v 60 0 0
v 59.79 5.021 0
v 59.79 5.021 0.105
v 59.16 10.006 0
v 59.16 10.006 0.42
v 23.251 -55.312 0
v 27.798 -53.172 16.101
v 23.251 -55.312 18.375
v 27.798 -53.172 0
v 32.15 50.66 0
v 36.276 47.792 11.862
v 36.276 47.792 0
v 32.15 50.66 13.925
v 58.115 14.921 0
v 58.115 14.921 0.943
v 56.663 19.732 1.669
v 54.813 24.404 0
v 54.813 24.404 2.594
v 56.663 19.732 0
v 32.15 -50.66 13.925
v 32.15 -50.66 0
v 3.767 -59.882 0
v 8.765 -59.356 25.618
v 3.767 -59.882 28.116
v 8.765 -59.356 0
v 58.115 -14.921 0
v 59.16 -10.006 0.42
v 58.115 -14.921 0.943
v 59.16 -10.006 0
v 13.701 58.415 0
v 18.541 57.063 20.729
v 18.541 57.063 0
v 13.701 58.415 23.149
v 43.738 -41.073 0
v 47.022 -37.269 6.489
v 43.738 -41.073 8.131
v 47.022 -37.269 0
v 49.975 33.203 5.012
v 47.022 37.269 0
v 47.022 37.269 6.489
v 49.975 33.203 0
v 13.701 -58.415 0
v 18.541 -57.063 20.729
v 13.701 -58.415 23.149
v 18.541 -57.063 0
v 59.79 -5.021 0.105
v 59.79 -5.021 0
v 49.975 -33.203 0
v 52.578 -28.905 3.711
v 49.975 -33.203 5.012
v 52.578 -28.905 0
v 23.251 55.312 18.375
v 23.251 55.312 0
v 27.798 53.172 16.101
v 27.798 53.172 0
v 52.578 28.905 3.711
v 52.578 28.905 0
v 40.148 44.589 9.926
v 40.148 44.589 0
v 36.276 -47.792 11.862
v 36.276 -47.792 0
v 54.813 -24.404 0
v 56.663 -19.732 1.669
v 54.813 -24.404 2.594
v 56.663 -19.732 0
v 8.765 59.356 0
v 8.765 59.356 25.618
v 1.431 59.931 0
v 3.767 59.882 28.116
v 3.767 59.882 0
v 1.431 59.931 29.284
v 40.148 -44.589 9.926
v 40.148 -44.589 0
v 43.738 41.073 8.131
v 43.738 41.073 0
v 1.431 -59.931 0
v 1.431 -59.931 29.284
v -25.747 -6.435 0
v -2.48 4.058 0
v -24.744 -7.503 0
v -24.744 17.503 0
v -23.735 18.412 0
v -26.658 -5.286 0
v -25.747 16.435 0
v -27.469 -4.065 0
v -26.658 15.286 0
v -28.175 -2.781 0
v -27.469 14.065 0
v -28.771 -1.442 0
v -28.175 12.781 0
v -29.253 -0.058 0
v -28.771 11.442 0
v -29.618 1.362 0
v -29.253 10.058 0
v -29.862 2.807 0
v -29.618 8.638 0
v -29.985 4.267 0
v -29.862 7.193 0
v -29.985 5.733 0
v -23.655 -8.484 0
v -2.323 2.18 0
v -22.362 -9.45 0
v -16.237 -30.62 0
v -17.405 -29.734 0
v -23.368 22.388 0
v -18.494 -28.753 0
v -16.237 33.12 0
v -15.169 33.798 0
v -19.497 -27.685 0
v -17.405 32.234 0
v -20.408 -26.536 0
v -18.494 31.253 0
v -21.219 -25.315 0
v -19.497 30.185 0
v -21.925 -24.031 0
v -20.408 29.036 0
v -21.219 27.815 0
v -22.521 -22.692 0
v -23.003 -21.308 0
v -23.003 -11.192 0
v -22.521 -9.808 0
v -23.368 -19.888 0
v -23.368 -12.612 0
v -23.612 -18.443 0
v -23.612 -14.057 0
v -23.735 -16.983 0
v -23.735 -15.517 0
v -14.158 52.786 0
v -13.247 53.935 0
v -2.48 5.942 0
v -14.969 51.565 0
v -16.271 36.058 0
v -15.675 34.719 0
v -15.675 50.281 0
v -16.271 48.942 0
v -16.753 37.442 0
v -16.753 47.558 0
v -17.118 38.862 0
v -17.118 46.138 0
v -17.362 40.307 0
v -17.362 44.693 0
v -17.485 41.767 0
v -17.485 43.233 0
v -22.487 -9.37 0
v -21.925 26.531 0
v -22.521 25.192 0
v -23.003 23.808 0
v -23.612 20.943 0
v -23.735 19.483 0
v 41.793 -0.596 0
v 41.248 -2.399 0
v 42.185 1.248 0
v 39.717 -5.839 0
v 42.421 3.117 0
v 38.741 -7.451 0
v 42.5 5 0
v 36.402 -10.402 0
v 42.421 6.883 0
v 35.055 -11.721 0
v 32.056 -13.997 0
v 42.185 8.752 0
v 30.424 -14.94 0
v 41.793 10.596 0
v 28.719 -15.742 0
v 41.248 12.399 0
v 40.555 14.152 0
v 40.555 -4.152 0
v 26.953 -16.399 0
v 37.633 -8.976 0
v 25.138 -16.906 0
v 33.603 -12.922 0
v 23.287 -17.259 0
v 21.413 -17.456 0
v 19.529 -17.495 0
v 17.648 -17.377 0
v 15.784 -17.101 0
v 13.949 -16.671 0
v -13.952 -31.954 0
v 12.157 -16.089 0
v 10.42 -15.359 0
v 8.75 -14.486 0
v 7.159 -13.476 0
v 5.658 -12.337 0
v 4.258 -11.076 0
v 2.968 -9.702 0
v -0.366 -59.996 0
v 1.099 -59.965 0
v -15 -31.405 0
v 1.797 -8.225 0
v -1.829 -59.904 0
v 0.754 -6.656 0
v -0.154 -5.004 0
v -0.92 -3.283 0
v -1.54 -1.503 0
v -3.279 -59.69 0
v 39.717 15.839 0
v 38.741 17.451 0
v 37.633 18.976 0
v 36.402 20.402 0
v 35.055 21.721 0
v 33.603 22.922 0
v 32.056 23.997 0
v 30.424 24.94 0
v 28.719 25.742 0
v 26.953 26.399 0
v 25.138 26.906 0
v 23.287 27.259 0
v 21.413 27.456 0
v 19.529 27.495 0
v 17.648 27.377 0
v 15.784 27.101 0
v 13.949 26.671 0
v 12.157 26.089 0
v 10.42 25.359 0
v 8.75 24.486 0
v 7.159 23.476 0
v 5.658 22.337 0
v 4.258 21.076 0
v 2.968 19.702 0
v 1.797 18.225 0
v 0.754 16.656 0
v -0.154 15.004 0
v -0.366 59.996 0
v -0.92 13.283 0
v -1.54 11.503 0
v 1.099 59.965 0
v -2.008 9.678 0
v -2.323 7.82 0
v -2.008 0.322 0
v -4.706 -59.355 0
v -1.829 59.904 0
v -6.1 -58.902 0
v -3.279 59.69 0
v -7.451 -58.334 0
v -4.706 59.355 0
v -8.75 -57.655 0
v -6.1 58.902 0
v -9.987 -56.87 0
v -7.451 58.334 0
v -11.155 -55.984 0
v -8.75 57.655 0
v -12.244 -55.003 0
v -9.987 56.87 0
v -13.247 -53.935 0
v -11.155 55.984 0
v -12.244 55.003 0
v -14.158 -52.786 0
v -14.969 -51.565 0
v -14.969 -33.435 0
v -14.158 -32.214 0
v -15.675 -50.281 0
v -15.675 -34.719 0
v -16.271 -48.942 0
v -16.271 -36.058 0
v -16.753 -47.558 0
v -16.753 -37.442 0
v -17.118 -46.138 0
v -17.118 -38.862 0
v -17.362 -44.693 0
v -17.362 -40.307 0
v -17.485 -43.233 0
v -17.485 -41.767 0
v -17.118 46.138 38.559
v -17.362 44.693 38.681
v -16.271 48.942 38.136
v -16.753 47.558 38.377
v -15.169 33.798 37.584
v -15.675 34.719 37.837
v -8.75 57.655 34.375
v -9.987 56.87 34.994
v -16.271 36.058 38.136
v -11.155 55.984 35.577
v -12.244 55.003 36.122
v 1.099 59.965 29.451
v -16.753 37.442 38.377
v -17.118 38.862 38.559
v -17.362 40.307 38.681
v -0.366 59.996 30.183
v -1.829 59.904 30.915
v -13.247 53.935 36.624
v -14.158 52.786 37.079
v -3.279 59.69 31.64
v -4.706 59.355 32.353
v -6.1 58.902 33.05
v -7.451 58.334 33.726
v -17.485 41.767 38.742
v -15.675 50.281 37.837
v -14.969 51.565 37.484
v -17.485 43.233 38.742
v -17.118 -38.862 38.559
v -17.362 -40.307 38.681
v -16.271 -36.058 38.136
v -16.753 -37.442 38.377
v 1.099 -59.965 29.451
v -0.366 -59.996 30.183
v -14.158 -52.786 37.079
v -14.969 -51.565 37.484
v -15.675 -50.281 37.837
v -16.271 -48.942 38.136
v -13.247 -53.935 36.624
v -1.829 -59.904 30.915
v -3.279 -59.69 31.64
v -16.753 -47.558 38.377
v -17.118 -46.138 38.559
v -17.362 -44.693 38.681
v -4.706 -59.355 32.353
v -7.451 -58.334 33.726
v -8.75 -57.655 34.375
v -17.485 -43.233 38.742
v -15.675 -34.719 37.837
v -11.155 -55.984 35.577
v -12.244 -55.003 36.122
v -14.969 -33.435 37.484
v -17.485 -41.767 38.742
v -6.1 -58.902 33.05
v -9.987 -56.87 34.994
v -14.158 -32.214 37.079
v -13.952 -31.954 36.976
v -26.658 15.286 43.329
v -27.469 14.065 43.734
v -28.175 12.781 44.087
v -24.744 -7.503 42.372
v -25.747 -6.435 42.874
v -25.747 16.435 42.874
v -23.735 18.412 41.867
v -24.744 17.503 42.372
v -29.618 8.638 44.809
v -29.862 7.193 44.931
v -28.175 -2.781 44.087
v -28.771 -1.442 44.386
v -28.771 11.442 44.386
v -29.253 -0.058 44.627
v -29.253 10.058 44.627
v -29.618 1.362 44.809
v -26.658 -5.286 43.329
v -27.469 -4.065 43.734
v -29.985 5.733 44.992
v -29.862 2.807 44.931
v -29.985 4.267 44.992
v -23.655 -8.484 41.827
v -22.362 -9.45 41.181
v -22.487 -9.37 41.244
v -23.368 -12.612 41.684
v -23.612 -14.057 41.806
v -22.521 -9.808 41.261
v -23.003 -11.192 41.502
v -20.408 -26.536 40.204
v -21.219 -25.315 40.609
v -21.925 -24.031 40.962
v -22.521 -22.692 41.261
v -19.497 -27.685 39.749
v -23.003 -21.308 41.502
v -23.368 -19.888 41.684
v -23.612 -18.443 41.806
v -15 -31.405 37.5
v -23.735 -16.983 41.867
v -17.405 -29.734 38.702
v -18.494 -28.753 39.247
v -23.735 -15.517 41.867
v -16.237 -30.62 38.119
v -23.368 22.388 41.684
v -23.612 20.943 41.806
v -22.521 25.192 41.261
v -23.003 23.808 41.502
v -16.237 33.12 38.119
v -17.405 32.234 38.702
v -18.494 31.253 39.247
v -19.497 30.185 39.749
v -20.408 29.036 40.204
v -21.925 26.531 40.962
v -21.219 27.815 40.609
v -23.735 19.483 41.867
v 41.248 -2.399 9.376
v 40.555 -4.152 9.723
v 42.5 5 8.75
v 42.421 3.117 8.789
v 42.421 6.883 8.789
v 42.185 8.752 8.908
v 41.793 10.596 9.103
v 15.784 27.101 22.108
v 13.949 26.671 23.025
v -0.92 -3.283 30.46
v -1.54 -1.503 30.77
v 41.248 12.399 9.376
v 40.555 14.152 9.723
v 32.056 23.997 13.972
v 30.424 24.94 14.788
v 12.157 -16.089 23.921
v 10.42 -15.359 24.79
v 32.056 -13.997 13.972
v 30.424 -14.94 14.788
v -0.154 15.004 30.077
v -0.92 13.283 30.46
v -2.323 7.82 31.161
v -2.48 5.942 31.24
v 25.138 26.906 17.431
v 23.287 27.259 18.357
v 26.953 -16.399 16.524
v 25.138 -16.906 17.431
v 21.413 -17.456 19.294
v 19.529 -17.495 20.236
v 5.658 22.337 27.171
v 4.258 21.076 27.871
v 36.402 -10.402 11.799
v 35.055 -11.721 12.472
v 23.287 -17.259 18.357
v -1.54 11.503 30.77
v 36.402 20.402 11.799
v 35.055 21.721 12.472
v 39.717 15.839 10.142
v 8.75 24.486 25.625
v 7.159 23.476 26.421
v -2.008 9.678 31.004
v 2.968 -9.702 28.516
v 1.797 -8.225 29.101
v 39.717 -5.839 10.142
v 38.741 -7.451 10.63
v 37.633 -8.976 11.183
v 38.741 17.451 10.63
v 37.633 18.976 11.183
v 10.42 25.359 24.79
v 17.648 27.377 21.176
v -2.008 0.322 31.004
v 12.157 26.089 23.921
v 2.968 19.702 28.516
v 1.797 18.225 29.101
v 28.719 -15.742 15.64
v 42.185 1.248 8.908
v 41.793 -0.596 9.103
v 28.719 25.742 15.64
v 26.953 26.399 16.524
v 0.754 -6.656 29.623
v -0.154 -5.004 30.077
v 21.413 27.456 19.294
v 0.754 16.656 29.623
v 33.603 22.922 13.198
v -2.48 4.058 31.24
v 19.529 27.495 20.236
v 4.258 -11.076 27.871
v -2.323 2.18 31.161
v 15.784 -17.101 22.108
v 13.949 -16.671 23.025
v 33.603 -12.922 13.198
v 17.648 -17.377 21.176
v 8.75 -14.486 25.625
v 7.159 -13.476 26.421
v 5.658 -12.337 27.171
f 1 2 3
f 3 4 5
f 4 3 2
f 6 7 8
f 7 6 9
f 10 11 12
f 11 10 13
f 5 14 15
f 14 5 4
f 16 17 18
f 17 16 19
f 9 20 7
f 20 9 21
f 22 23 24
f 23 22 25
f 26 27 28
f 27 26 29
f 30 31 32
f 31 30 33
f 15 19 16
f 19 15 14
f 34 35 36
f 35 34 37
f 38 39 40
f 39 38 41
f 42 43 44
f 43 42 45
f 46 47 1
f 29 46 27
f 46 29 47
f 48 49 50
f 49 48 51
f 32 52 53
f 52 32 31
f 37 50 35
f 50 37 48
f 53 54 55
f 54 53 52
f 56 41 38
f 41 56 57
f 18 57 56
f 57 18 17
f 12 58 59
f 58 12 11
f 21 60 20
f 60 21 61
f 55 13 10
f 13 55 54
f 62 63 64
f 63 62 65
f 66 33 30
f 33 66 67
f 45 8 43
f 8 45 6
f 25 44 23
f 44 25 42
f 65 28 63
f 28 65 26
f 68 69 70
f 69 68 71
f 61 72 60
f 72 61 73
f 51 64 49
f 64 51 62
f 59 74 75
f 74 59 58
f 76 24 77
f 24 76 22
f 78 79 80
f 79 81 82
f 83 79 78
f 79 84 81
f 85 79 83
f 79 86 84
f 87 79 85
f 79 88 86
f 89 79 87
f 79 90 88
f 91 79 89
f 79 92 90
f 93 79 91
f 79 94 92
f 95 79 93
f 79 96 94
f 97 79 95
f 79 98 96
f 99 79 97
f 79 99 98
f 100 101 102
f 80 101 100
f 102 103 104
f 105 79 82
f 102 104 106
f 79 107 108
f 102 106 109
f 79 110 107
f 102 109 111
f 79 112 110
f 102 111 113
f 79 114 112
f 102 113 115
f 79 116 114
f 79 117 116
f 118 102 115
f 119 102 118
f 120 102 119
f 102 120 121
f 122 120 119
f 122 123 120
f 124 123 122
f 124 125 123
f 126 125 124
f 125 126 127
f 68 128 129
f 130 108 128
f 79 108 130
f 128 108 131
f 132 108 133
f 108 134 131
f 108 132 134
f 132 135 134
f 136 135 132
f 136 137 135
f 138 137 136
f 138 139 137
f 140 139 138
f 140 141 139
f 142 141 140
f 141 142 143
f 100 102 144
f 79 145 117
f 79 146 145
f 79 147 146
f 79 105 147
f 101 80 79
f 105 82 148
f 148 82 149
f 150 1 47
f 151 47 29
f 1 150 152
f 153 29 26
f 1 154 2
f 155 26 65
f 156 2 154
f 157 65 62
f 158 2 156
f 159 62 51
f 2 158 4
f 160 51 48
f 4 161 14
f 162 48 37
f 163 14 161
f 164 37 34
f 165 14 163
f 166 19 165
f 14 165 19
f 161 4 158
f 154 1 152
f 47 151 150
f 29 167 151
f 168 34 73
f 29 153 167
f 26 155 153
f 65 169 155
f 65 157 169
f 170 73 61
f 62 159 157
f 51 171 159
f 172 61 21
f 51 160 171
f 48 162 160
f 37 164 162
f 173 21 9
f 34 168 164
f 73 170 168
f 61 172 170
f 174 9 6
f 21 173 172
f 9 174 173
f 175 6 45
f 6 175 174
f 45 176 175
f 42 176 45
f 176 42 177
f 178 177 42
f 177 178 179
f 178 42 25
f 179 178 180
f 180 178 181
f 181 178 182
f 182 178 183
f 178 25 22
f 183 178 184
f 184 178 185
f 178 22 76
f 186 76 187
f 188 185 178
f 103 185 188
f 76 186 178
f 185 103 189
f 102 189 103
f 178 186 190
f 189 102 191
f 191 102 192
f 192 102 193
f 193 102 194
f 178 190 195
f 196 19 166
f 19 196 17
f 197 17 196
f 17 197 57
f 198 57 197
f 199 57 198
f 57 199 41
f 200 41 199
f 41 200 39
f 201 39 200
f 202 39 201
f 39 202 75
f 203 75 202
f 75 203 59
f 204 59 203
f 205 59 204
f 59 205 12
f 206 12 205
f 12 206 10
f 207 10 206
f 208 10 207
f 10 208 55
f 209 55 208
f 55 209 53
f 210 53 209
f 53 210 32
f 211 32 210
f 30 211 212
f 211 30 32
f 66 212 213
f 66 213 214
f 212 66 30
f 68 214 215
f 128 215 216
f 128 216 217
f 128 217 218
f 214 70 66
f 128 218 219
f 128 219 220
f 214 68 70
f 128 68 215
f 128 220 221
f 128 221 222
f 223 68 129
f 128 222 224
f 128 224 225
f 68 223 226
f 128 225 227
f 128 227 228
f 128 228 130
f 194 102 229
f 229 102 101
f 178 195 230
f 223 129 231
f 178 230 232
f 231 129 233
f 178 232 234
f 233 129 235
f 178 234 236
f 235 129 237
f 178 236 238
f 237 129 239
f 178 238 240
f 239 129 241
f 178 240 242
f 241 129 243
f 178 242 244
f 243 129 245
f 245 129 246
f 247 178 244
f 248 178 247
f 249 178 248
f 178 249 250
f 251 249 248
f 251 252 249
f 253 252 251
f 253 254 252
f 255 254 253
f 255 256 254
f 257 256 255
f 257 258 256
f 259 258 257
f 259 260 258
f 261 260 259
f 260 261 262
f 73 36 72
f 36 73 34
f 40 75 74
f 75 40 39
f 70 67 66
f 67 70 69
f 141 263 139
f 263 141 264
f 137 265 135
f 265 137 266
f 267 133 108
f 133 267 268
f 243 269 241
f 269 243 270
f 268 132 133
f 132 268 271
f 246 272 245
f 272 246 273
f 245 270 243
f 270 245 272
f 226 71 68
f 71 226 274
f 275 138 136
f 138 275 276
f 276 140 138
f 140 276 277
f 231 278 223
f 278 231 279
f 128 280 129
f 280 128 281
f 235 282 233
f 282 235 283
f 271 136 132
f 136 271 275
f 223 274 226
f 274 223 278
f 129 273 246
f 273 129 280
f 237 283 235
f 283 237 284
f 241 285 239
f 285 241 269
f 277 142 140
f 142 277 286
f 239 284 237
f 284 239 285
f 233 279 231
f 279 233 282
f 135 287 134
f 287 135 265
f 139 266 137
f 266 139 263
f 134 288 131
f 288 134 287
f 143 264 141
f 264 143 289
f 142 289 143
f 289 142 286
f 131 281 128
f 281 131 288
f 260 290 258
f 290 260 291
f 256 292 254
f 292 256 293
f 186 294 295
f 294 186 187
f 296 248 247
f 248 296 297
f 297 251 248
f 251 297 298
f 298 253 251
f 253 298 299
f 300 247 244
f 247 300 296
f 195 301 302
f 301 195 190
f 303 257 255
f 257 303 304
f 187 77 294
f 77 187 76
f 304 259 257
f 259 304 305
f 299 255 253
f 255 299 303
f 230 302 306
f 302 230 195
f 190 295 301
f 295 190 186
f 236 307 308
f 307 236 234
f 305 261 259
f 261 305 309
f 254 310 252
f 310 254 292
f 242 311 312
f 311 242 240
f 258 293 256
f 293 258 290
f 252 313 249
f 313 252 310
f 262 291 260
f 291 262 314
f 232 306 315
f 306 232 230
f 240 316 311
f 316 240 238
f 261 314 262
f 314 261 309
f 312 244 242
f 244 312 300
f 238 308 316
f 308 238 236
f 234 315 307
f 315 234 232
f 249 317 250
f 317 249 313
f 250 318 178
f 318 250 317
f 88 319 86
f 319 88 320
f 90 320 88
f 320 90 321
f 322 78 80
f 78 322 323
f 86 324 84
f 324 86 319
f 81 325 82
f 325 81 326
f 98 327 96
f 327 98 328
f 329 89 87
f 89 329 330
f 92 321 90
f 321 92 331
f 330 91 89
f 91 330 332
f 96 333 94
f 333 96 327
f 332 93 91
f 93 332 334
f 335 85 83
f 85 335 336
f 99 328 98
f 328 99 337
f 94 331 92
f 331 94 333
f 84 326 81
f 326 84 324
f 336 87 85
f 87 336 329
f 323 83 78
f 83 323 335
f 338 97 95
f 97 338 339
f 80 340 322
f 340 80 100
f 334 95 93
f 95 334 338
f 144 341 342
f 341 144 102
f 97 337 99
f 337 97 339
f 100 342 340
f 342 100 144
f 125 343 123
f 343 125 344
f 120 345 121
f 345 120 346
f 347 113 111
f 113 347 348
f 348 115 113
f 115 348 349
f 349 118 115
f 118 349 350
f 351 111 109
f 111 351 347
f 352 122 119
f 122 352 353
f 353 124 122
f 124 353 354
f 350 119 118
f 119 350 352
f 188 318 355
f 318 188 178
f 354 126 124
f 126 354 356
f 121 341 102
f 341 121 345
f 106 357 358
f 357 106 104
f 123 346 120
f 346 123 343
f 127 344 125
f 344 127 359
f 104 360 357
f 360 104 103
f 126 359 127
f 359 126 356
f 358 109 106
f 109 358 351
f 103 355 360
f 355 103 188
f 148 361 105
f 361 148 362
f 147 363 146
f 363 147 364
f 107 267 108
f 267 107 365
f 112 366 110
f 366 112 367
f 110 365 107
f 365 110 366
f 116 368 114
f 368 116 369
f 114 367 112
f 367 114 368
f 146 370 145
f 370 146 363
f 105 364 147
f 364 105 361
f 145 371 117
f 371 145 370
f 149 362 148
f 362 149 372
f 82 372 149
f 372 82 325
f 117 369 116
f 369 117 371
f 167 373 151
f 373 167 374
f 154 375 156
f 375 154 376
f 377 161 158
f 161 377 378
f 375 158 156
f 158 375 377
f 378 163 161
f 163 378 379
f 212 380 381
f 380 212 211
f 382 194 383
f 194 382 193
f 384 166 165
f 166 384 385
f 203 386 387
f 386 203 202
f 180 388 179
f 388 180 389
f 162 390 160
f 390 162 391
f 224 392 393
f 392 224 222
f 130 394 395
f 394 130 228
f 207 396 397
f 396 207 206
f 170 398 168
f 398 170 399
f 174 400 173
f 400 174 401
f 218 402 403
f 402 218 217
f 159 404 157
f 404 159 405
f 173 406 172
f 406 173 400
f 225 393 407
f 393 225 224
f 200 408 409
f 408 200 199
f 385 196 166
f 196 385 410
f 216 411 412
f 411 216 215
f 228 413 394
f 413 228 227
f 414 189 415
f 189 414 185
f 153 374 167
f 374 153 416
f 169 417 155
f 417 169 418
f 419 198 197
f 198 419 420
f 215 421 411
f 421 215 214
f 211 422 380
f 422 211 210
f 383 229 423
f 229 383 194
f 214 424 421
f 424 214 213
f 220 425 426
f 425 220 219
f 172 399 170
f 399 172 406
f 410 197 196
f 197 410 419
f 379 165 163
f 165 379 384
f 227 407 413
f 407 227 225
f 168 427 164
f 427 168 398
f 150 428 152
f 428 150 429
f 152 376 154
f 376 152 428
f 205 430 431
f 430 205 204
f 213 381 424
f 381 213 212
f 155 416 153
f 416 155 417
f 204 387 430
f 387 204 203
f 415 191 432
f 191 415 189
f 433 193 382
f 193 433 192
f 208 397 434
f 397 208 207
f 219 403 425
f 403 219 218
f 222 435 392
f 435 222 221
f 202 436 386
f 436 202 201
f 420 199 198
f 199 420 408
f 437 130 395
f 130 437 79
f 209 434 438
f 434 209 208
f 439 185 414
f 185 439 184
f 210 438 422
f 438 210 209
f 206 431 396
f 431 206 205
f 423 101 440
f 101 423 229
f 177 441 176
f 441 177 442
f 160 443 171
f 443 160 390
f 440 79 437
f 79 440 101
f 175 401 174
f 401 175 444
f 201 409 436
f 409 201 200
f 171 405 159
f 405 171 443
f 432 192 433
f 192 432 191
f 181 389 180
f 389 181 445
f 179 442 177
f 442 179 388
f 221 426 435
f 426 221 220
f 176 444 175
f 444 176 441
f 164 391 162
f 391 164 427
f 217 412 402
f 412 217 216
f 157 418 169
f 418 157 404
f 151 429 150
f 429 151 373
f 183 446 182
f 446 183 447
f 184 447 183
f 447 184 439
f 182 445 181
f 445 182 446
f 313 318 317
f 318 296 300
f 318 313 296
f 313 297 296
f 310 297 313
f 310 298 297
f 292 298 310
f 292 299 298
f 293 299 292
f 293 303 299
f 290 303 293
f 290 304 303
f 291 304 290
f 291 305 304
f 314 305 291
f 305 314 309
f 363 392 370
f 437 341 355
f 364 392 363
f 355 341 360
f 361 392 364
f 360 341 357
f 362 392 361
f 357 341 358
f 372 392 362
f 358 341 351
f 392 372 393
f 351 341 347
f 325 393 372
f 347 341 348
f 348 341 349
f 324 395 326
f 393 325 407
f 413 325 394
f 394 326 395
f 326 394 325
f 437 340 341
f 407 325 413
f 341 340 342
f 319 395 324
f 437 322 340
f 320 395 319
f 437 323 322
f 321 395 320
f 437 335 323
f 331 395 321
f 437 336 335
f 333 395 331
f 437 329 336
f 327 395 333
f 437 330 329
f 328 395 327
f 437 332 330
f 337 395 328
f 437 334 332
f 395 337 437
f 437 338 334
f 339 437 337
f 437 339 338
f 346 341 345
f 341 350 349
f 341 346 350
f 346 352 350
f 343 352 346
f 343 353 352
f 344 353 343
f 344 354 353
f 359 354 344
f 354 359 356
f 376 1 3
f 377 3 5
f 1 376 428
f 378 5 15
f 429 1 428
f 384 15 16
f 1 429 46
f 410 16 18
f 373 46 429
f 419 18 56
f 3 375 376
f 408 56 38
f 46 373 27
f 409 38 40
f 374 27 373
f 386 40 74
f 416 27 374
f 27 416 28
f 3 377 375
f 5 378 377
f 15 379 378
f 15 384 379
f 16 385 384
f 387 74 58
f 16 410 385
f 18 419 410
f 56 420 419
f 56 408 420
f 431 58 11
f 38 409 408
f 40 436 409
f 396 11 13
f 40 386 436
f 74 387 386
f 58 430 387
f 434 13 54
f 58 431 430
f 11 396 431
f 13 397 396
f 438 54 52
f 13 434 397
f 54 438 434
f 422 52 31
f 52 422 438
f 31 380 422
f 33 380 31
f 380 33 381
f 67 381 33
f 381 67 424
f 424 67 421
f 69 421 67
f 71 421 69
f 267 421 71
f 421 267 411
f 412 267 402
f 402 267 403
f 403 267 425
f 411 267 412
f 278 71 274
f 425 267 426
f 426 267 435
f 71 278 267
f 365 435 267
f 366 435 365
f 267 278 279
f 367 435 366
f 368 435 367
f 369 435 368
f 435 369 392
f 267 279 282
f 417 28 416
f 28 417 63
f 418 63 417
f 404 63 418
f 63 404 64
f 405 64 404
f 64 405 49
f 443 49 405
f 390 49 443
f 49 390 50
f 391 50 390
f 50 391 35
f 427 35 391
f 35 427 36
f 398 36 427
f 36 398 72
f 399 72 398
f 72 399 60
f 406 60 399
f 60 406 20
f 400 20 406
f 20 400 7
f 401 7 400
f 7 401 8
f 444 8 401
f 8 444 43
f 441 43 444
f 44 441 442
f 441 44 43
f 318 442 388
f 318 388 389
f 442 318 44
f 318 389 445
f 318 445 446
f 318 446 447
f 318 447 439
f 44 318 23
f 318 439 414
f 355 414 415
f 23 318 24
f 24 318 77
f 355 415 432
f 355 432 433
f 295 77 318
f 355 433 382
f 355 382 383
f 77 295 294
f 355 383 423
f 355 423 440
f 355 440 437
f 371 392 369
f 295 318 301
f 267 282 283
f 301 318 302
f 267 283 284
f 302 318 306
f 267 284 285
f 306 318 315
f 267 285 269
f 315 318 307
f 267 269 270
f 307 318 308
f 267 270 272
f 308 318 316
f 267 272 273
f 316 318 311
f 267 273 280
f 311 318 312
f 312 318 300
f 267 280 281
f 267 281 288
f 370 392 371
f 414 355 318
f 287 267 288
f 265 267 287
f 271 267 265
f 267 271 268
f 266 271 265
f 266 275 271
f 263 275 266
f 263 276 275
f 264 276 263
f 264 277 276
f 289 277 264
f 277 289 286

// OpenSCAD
// created by IndiePandaaaaa

TOLERANCE = .1;
THICKNESS = 2.5;
CHAMFER = 1;
$fn = 75;

// model for reference: Logitech Logi ERGO M575

ANGLE = 30;
WIDTH = 90;
HEIGHT = sin(ANGLE) * WIDTH;
DEPTH = 120;

intersection() {
  translate([- WIDTH / 2 + (DEPTH - WIDTH) / 2, DEPTH / 2, 0]) rotate([90, 0, 0]) {
    linear_extrude(DEPTH) {
      polygon([
        [0, 0],
        [WIDTH, 0],
        [0, HEIGHT],
      ]);
    }
  }
  difference() {
    dia_little = 35;
    middle_ball_offset = 5;
    union() {
      difference() {
        cylinder(d = DEPTH, h = HEIGHT);
        translate([-DEPTH, - DEPTH / 2, -1]) cube(DEPTH);
      }

      translate([0, DEPTH / 2 - dia_little / 2, 0]) cylinder(d = dia_little, h = HEIGHT);
      translate([0, -DEPTH / 2 + dia_little / 2, 0]) cylinder(d = dia_little, h = HEIGHT);
      translate([- WIDTH + (DEPTH / 2) + dia_little / 2, middle_ball_offset, 0]) cylinder(d = dia_little, h = HEIGHT);
      translate([(- WIDTH + (DEPTH / 2) + dia_little / 2) * .5, middle_ball_offset * - 3.25, 0]) cylinder(d = dia_little, h = HEIGHT);
      translate([(- WIDTH + (DEPTH / 2) + dia_little / 2) * .5, middle_ball_offset * 3.75, 0]) cylinder(d = dia_little, h = HEIGHT);
    }
    translate([20, middle_ball_offset, - .01]) cylinder(d = 45, h = HEIGHT);
  }
}
